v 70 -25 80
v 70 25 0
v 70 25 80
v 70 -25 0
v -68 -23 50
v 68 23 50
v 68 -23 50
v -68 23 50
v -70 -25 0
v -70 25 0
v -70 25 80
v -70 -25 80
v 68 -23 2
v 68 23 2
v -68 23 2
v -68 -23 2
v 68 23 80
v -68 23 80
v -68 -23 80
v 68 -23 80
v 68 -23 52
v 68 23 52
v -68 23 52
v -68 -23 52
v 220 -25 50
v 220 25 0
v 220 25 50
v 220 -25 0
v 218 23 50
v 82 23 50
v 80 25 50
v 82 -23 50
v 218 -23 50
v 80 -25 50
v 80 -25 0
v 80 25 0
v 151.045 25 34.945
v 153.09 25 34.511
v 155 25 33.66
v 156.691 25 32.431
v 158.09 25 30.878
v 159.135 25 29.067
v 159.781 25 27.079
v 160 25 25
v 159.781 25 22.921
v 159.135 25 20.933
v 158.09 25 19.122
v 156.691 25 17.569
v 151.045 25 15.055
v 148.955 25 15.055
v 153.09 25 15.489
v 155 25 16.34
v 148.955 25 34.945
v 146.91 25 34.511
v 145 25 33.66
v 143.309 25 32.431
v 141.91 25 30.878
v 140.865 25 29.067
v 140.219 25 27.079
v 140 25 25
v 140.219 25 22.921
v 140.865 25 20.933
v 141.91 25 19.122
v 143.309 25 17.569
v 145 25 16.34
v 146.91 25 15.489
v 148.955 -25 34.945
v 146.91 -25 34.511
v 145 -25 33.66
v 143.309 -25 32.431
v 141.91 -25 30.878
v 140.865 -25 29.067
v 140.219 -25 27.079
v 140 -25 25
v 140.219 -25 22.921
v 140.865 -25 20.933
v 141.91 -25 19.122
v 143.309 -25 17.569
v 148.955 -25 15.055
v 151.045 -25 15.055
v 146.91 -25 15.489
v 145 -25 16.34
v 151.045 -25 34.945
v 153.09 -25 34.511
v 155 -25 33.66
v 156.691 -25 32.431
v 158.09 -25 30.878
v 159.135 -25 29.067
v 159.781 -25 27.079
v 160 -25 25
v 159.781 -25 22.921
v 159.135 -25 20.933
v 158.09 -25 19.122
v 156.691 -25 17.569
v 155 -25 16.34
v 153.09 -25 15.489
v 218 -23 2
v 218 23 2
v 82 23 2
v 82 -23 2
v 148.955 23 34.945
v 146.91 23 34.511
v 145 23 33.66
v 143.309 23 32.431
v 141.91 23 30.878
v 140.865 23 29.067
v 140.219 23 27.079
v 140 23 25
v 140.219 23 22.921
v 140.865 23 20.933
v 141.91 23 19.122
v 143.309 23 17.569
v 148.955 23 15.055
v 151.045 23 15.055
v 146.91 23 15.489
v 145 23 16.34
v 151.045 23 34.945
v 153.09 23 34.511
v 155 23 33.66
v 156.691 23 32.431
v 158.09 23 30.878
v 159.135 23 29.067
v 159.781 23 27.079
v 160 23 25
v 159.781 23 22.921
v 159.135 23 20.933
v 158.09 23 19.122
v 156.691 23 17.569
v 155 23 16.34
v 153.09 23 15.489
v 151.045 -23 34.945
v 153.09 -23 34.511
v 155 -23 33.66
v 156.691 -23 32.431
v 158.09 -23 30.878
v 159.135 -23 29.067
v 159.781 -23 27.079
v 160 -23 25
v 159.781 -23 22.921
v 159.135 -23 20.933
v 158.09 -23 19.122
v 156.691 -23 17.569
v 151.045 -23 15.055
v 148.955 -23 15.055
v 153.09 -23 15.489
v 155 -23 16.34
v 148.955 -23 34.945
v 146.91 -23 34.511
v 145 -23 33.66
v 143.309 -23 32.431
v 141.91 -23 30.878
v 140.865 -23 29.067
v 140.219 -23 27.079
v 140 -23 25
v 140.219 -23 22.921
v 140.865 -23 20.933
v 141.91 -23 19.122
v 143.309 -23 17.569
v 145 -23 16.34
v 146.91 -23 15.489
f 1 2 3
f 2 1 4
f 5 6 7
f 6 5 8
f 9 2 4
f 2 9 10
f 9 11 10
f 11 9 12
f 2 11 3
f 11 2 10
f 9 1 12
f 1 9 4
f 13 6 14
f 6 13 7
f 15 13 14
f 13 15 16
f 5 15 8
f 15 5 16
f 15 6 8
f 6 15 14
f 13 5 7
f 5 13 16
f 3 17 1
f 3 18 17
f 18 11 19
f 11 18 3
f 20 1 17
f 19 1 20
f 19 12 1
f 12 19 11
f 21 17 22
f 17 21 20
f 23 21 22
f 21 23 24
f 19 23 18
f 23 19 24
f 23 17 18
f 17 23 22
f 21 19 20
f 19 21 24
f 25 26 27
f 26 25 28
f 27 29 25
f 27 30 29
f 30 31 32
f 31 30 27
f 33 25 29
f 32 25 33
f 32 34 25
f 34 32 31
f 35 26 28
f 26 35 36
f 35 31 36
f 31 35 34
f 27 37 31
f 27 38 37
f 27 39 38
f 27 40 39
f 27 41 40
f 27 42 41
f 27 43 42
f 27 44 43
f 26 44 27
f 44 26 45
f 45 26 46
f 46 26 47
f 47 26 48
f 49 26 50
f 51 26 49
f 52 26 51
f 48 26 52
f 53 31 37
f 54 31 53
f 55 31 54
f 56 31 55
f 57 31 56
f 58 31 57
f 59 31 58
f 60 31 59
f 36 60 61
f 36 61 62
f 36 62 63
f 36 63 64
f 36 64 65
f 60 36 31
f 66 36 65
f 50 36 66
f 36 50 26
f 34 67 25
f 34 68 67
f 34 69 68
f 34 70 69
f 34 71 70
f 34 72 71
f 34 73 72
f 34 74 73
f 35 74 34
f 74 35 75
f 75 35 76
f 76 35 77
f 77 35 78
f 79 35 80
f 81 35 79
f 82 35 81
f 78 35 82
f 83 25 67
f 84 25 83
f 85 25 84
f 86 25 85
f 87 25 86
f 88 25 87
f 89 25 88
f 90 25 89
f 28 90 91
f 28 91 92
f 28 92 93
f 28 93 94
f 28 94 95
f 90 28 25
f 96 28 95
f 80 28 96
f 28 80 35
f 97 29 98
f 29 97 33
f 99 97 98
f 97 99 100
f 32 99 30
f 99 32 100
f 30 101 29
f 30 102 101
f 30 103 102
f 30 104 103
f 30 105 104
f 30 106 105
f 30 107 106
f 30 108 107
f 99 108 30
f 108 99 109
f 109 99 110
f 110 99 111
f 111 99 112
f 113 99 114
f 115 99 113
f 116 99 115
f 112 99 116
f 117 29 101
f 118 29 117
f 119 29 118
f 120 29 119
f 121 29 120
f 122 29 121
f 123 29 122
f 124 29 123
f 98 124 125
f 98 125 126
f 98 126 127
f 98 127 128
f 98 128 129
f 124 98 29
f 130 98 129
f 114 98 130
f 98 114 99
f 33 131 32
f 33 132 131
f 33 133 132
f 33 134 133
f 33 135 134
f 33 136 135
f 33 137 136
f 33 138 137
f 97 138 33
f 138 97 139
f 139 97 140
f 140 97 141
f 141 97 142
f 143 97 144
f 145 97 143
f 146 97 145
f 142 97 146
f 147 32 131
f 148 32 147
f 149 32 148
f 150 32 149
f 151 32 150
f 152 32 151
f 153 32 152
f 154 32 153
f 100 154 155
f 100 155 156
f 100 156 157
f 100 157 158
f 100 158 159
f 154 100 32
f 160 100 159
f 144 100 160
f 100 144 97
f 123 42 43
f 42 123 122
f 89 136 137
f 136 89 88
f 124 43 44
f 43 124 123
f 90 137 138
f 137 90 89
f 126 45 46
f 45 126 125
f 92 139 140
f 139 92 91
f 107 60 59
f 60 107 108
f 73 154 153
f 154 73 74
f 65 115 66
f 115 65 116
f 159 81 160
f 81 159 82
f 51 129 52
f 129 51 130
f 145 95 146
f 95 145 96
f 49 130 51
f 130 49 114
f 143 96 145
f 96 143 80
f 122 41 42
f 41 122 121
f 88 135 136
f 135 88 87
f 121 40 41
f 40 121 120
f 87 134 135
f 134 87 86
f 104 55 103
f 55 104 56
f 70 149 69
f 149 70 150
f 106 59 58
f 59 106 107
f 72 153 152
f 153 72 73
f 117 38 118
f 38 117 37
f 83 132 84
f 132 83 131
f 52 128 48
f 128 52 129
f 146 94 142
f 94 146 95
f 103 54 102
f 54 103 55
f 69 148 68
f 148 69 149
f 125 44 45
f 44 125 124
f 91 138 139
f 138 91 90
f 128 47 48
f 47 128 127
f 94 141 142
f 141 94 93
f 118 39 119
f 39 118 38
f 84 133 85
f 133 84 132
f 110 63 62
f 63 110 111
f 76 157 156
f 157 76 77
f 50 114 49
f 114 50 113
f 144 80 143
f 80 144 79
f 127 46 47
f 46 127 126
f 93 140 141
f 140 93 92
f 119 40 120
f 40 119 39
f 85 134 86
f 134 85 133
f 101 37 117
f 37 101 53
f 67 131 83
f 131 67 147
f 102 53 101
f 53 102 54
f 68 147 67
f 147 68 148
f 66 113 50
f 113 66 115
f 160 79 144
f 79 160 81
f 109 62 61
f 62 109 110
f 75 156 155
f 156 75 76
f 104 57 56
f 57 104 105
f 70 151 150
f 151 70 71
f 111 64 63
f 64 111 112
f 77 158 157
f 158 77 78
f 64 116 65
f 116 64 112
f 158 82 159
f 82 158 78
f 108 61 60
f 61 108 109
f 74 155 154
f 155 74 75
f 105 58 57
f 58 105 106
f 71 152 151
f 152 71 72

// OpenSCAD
depth_mm = 50;
width_mm = 140;
RENDER = 1;
dovetail_margin_mm = 0.5;
knife_margin_mm = 0.01;
wall_mm = 2;

module dovetail() {
    y = 10;
    y_in = 7;
    z = 5;
    points = [[0,y_in],[z,y],[z,-y],[0,-y_in]];
    rotate([0,-90,0])
    linear_extrude(height = width_mm,center = true)
    polygon(points);
}

module generic_component(height_mm) {
    difference() 
    {translate([-width_mm/2, -depth_mm/2, 0])
    cube([width_mm, depth_mm, height_mm]);
    
    translate([-width_mm/2 + wall_mm,-depth_mm/2 + wall_mm,wall_mm
        ])
        cube([width_mm - 2*wall_mm,depth_mm - 2*wall_mm, height_mm - wall_mm]);
        }
}

module speaker_component() {
    difference() {
        generic_component(50);
        translate([0,0,25])
        rotate([90,0,0])
        cylinder(100,10,10,center=true);
    }
}
module top_end_plate() {
}

module bottom_end_plate() {
}

module blank_face_plate() {
}


if (RENDER) {
    color("blue")
    generic_component(50);
    
    
    translate([0,0,50])
    color("green")
    generic_component(30);
    
    translate([150,0,0])
    color("red")
    speaker_component();
}

module female_dovetail() {

    y = 10 + dovetial_margin_mm;
    y_in = 7 + dovetial_margin_mm;
    z = 5 + dovetial_margin_mm;

    points = [
        [0-knife_margin_mm, y_in],
        [z, y],
        [z,-y],
        [0-knife_margin_mm,-y_in]
    ];

    rotate([0,-90,0])
        linear_extrude(height = width_mm + 2, center = true)
            polygon(points);
}
